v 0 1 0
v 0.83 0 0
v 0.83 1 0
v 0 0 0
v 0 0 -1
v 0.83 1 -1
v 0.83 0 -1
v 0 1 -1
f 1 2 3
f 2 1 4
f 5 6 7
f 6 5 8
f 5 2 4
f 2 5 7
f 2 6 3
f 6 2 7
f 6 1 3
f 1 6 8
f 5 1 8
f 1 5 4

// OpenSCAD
//------------------------------------------------------
// Base
// BAse
// 5@xes 15/07/2022
// Size Must be close to 1x1 !
//------------------------------------------------------

$fn=20;


//render() translate([0.5,0,0]) mirror([1,0,0]) letter("/");
render() translate([0,0,-1]) cube(size = [0.83,1,1], center = false);
